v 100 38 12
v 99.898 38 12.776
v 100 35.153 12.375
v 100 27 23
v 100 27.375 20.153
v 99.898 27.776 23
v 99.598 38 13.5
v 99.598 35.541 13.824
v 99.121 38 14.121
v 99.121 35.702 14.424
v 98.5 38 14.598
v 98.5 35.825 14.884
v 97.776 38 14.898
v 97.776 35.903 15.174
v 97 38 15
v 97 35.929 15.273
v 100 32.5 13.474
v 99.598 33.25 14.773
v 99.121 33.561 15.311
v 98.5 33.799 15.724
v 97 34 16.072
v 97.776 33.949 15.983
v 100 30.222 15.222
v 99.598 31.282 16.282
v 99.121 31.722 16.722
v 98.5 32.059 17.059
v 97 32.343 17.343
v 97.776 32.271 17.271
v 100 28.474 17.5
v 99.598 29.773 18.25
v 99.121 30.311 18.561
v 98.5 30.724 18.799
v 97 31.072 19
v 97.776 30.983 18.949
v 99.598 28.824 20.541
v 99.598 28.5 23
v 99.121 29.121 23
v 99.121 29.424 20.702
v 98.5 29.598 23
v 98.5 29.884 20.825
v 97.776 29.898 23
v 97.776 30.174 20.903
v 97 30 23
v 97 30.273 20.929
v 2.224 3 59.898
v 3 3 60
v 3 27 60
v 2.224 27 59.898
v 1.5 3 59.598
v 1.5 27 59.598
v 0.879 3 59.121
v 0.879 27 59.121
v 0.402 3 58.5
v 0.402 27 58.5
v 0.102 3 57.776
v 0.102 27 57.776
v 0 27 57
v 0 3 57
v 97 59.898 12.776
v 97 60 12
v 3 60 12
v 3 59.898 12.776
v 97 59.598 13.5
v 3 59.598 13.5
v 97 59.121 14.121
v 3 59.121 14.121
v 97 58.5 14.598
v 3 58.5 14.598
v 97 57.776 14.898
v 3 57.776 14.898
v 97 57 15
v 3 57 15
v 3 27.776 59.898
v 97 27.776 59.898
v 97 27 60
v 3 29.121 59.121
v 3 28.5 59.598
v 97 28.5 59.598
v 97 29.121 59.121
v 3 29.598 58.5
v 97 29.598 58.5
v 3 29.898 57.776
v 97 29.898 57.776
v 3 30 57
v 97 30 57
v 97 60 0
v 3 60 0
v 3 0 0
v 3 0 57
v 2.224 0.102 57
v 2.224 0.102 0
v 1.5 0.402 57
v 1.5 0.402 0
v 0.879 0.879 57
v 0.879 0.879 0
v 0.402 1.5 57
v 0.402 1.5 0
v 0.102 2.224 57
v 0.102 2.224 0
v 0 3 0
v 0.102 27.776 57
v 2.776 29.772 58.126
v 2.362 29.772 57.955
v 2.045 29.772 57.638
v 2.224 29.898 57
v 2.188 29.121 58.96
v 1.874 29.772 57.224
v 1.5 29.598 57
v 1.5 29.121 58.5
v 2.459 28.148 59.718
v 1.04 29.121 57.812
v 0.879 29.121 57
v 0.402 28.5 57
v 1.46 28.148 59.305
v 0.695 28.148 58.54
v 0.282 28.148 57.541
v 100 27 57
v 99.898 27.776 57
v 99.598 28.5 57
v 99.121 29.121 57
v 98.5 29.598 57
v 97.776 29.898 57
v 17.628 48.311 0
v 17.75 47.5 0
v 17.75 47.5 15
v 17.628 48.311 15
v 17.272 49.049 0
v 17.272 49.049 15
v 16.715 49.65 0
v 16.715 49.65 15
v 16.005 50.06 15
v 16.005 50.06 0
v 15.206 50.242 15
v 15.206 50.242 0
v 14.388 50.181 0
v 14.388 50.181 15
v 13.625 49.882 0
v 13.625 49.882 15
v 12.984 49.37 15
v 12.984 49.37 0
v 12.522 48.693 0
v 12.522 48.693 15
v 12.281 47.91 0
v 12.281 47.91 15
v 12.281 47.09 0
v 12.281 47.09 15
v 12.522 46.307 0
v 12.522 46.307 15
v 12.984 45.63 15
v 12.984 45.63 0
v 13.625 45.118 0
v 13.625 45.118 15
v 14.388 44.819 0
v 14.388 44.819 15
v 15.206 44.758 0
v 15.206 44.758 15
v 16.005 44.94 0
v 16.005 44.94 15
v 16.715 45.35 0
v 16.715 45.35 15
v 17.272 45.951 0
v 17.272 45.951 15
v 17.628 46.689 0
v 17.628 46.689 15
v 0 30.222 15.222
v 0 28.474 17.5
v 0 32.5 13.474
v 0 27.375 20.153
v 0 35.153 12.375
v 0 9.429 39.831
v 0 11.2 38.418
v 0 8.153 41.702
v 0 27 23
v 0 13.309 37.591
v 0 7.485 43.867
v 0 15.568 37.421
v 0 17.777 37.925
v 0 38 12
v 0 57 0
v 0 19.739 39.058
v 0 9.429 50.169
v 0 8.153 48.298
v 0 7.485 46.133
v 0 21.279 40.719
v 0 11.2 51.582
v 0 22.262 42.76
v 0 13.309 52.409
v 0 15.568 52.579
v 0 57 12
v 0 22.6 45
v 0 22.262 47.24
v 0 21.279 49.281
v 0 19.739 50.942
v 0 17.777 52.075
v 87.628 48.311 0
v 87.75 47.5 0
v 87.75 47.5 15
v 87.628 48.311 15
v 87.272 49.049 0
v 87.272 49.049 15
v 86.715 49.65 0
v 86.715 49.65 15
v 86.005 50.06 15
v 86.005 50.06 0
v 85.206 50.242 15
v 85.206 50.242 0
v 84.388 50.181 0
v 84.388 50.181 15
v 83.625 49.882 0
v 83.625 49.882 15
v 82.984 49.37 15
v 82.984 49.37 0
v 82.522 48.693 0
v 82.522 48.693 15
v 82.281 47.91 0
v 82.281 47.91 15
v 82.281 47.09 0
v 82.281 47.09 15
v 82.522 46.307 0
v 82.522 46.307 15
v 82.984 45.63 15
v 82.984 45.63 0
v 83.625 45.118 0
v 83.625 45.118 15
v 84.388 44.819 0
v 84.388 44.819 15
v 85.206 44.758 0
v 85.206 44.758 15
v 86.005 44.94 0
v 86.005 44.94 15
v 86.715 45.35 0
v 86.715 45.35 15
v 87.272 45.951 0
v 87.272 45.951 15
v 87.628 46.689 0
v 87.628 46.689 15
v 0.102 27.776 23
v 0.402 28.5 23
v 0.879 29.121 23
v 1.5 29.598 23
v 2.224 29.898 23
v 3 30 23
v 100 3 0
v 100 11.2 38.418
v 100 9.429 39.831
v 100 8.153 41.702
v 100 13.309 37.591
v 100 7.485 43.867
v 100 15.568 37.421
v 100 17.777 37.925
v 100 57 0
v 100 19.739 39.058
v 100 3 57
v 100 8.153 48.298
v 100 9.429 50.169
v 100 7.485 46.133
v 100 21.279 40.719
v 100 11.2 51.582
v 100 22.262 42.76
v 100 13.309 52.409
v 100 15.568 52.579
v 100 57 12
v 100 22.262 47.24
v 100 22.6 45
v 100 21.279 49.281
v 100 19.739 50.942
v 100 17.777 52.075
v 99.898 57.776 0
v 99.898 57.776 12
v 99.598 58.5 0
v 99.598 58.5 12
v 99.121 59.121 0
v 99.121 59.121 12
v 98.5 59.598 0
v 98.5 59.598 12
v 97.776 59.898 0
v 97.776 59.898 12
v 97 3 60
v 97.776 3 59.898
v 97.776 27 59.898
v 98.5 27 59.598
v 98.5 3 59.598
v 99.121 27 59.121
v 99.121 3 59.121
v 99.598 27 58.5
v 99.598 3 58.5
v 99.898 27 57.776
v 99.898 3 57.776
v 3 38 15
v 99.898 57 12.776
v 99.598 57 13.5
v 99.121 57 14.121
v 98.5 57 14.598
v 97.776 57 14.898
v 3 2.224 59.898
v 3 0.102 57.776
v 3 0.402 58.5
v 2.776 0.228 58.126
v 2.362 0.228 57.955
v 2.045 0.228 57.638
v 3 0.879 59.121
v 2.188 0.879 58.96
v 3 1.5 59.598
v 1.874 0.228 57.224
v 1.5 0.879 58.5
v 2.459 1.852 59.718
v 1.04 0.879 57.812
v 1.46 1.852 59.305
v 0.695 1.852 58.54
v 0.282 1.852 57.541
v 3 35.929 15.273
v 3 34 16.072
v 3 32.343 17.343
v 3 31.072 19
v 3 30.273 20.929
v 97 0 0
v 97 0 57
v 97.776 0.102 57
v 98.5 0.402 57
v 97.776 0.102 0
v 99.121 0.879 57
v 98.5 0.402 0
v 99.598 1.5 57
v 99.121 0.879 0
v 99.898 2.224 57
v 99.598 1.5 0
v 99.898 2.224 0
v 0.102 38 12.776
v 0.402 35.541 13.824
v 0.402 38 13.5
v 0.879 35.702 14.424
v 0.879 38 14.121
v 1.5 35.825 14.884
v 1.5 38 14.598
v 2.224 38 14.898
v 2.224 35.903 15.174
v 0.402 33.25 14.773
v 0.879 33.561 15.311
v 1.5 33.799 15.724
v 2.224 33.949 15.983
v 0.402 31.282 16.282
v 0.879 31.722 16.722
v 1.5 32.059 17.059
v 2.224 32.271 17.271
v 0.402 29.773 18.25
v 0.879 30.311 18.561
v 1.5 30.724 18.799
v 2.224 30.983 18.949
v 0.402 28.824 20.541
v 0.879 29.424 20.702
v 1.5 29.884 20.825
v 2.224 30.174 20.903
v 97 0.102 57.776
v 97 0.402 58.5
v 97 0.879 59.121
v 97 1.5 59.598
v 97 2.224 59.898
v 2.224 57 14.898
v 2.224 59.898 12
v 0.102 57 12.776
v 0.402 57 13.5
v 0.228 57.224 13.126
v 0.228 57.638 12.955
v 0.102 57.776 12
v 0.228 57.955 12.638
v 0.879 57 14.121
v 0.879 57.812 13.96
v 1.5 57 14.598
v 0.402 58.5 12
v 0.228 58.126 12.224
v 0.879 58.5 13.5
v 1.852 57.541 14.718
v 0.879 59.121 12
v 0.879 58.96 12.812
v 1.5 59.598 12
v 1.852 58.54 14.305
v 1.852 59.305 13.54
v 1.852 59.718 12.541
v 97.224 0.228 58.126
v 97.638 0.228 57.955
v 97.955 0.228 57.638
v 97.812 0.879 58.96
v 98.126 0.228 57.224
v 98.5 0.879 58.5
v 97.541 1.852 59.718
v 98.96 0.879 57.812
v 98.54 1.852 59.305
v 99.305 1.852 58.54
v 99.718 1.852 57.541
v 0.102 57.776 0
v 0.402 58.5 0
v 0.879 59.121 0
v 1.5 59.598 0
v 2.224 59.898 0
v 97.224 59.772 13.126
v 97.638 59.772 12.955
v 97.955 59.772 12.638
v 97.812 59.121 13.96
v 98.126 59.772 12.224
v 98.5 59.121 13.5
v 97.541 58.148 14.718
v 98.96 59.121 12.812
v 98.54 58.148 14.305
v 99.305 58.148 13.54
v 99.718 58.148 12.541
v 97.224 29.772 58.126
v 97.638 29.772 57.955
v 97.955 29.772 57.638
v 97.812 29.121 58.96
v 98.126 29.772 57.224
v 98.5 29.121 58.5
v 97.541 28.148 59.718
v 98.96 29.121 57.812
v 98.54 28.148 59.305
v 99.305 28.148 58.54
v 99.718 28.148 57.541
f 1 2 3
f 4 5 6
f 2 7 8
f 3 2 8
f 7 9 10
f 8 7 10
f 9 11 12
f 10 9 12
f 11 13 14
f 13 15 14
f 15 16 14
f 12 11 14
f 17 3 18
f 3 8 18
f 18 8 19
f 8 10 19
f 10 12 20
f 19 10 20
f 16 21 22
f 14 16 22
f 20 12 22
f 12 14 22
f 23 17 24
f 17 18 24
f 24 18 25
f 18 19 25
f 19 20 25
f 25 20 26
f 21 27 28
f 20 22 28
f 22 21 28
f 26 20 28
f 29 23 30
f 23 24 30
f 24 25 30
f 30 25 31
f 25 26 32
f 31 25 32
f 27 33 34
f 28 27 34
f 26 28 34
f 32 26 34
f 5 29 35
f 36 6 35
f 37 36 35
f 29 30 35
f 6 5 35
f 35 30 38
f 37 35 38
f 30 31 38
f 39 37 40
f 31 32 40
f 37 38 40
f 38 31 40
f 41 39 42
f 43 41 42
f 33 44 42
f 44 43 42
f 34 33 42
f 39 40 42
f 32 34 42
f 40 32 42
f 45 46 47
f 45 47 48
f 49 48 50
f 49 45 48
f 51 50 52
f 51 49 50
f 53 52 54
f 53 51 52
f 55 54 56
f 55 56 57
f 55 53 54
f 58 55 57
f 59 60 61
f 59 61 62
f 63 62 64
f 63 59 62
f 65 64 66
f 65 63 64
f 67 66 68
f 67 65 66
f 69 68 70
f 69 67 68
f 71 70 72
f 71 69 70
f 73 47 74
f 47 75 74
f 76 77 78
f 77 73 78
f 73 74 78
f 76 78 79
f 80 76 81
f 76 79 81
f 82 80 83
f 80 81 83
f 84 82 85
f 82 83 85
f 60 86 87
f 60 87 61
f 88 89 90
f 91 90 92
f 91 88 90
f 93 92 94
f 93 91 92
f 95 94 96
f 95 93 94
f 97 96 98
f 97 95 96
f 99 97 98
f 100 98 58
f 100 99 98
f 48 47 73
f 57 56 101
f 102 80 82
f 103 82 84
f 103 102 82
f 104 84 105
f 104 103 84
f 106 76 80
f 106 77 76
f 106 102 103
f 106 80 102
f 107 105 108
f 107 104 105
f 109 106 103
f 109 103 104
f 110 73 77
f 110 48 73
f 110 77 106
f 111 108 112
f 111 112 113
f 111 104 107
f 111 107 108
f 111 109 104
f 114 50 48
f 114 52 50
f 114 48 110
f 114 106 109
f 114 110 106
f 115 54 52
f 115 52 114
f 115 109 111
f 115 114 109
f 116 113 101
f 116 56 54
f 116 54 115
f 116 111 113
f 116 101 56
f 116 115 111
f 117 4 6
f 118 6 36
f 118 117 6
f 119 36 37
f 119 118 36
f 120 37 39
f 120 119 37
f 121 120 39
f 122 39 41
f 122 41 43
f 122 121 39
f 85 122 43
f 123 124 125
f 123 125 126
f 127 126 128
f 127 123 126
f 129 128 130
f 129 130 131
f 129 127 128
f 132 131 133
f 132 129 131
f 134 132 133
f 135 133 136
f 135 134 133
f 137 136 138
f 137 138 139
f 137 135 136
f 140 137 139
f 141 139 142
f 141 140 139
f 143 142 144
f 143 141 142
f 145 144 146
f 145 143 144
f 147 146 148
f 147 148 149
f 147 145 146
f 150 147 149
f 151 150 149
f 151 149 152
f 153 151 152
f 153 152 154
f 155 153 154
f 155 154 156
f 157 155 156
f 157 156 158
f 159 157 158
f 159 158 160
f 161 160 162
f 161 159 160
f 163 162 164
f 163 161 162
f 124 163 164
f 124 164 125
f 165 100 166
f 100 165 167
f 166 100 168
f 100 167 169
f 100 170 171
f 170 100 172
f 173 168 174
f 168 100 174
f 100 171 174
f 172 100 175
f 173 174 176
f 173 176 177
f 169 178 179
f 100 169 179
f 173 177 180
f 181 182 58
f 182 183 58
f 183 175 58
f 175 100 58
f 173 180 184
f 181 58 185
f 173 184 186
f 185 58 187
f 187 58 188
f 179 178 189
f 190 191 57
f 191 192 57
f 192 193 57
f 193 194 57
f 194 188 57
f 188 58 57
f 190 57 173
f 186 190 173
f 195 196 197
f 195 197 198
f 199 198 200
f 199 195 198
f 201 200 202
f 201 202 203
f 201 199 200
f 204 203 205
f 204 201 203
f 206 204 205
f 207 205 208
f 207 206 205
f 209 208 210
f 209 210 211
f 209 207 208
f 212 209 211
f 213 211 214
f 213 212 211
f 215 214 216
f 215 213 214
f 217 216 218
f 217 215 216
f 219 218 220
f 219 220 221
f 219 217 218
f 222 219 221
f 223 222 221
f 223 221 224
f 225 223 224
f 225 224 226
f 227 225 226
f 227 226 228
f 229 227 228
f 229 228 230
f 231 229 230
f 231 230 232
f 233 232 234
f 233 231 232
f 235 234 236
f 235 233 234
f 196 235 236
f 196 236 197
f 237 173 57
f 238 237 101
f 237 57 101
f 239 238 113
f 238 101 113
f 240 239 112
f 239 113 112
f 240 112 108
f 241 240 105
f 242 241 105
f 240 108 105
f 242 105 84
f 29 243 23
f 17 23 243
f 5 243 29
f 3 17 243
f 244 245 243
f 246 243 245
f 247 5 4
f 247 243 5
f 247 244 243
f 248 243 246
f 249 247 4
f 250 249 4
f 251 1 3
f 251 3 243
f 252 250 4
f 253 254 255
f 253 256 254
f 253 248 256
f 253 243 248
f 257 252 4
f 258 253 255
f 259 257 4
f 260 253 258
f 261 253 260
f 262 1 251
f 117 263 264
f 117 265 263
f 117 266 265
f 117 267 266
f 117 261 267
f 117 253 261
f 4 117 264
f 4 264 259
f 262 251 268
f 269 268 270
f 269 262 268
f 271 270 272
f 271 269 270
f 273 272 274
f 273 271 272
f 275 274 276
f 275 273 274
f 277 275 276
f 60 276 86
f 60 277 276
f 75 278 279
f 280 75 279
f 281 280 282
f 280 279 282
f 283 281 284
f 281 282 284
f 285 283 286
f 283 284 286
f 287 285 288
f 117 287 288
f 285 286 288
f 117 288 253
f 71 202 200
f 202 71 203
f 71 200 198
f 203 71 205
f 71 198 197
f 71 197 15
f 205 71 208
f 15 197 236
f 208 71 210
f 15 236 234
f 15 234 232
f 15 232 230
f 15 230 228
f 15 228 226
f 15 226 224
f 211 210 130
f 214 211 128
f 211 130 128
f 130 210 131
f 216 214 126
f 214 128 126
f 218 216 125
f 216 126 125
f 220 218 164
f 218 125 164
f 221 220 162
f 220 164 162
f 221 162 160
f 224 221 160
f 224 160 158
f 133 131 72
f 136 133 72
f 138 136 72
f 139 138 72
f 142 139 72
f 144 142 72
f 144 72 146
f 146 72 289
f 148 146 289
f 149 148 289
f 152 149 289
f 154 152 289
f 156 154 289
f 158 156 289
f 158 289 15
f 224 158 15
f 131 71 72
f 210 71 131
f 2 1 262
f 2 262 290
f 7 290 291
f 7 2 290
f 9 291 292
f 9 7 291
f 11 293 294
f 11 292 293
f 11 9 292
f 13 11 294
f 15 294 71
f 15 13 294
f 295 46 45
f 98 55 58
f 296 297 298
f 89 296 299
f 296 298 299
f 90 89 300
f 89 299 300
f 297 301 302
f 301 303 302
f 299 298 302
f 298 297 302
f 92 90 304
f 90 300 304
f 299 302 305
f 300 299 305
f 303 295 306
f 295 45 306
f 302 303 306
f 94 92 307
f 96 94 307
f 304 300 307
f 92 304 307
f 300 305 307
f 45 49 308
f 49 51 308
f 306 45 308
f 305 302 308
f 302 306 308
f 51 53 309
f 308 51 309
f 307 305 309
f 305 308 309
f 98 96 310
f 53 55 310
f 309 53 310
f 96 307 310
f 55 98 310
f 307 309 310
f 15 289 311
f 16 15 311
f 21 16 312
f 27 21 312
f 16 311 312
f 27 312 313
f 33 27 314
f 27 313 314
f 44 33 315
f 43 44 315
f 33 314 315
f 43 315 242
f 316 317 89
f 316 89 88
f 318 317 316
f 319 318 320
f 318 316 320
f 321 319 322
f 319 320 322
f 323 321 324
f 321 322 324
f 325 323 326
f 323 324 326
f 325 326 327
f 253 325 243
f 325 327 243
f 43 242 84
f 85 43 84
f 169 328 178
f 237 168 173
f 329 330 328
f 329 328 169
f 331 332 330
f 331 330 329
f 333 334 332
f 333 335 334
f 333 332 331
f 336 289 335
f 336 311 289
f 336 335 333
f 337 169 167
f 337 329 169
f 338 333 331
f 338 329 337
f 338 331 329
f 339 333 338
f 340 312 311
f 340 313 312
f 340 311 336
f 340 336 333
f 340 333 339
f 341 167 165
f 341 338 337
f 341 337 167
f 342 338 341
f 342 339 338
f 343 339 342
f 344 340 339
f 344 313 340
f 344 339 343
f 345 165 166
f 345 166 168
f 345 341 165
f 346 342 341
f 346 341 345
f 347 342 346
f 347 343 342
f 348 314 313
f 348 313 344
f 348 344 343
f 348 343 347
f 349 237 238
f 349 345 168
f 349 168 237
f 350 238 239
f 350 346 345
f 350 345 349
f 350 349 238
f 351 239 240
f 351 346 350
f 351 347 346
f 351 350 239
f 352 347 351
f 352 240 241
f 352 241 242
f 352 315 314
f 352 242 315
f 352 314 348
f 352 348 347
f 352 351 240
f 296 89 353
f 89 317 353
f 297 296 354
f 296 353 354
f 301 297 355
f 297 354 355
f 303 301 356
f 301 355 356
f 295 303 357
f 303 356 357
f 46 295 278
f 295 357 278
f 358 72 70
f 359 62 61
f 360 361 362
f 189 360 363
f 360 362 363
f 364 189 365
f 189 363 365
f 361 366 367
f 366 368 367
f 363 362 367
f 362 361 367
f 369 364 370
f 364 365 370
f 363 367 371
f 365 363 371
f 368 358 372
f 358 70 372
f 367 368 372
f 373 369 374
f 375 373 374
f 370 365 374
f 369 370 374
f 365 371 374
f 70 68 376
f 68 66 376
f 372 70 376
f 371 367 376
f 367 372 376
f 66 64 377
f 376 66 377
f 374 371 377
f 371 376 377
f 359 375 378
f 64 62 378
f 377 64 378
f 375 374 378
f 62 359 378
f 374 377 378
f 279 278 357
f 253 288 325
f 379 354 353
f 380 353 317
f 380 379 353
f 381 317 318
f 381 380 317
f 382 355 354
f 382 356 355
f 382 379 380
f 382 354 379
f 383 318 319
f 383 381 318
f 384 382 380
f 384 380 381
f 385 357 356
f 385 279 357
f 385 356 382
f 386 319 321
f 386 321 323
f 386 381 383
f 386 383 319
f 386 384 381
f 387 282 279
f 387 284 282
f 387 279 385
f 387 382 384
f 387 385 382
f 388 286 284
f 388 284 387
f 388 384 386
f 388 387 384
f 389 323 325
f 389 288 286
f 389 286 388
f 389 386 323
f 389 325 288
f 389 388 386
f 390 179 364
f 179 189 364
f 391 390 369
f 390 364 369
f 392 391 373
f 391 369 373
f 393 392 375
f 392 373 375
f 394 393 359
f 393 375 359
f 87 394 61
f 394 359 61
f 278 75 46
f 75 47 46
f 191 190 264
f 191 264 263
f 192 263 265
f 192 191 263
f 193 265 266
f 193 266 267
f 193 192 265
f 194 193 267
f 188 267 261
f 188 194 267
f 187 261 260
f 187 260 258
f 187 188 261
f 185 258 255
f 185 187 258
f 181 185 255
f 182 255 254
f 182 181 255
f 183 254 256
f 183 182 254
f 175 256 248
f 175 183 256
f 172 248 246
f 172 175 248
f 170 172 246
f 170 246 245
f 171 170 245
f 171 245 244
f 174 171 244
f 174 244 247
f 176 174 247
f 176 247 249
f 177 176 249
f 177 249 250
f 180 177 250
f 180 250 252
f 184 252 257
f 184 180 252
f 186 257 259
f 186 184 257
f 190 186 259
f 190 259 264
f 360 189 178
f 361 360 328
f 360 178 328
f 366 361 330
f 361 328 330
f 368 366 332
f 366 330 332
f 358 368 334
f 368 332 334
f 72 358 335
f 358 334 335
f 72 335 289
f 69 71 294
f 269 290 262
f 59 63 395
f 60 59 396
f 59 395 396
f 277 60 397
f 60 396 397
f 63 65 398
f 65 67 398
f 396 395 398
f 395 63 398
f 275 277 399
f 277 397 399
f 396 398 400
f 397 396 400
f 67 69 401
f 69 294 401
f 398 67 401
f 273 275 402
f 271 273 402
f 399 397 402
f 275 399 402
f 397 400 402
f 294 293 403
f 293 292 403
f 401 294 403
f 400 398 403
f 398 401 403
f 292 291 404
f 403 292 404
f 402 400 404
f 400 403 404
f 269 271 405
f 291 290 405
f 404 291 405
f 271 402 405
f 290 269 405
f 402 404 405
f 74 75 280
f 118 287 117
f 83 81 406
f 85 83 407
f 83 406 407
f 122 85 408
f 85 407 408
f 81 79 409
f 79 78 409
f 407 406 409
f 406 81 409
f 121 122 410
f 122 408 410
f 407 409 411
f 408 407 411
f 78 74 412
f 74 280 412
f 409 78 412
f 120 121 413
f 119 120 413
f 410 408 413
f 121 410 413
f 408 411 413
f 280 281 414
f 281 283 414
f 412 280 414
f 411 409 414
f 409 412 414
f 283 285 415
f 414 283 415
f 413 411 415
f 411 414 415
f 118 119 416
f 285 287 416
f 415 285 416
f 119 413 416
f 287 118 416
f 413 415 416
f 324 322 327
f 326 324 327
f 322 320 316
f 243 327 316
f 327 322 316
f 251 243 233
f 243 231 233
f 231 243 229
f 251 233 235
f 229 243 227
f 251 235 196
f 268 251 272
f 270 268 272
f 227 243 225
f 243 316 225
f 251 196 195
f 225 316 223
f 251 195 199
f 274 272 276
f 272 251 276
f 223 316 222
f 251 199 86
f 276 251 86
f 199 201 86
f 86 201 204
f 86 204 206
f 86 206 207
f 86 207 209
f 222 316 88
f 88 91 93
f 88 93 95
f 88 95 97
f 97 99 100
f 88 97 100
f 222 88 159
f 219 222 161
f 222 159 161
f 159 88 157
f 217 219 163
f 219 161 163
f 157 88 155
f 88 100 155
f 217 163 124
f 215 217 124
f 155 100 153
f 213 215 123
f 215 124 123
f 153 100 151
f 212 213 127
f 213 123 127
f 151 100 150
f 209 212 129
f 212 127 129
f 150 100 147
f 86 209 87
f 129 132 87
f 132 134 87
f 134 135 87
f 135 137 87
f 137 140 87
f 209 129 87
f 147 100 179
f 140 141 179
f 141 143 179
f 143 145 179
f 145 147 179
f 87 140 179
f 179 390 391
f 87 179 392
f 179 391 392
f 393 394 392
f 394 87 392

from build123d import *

# Parameters (mm, degrees)
F0_R     = 7.6
F1_DEPTH = 100
F2_R     = 2.75
F3_DEPTH = 15
F4_R     = 3


with BuildPart() as f1:
    # F0 (on Right) → F1 (new body)
    with BuildSketch(Plane.YZ):
        with BuildLine():
            Line((0, 60), (0, 0))
            Line((0, 0), (60, 0))
            Line((60, 0), (60, 15))
            Line((60, 15), (38, 15))
            ThreePointArc((38, 15), (32.343146, 17.343146), (30, 23))
            Line((30, 23), (30, 60))
            Line((30, 60), (0, 60))
        make_face()
        with Locations((15, 45)):
            Circle(F0_R, mode=Mode.SUBTRACT)
    extrude(amount=F1_DEPTH)

    # F2 (on Top) → F3 (cut)
    with BuildSketch(Plane.XY):
        with Locations((15, 47.5)):
            Circle(F2_R)
        with Locations((85, 47.5)):
            Circle(F2_R)
    extrude(amount=F3_DEPTH, mode=Mode.SUBTRACT)

    # F4
    f4_edges = [f1.edges().sort_by_distance(p)[0] for p in [
        (100, 15, 60),
        (0, 15, 60),
        (50, 30, 60),
        (50, 0, 60),
        (100, 49, 15),
        (50, 60, 15),
        (0, 49, 15),
        (100, 0, 30),
        (0, 0, 30),
        (0, 60, 7.5),
        (100, 60, 7.5),
    ]]
    fillet(f4_edges, radius=F4_R)


solid = f1.part
